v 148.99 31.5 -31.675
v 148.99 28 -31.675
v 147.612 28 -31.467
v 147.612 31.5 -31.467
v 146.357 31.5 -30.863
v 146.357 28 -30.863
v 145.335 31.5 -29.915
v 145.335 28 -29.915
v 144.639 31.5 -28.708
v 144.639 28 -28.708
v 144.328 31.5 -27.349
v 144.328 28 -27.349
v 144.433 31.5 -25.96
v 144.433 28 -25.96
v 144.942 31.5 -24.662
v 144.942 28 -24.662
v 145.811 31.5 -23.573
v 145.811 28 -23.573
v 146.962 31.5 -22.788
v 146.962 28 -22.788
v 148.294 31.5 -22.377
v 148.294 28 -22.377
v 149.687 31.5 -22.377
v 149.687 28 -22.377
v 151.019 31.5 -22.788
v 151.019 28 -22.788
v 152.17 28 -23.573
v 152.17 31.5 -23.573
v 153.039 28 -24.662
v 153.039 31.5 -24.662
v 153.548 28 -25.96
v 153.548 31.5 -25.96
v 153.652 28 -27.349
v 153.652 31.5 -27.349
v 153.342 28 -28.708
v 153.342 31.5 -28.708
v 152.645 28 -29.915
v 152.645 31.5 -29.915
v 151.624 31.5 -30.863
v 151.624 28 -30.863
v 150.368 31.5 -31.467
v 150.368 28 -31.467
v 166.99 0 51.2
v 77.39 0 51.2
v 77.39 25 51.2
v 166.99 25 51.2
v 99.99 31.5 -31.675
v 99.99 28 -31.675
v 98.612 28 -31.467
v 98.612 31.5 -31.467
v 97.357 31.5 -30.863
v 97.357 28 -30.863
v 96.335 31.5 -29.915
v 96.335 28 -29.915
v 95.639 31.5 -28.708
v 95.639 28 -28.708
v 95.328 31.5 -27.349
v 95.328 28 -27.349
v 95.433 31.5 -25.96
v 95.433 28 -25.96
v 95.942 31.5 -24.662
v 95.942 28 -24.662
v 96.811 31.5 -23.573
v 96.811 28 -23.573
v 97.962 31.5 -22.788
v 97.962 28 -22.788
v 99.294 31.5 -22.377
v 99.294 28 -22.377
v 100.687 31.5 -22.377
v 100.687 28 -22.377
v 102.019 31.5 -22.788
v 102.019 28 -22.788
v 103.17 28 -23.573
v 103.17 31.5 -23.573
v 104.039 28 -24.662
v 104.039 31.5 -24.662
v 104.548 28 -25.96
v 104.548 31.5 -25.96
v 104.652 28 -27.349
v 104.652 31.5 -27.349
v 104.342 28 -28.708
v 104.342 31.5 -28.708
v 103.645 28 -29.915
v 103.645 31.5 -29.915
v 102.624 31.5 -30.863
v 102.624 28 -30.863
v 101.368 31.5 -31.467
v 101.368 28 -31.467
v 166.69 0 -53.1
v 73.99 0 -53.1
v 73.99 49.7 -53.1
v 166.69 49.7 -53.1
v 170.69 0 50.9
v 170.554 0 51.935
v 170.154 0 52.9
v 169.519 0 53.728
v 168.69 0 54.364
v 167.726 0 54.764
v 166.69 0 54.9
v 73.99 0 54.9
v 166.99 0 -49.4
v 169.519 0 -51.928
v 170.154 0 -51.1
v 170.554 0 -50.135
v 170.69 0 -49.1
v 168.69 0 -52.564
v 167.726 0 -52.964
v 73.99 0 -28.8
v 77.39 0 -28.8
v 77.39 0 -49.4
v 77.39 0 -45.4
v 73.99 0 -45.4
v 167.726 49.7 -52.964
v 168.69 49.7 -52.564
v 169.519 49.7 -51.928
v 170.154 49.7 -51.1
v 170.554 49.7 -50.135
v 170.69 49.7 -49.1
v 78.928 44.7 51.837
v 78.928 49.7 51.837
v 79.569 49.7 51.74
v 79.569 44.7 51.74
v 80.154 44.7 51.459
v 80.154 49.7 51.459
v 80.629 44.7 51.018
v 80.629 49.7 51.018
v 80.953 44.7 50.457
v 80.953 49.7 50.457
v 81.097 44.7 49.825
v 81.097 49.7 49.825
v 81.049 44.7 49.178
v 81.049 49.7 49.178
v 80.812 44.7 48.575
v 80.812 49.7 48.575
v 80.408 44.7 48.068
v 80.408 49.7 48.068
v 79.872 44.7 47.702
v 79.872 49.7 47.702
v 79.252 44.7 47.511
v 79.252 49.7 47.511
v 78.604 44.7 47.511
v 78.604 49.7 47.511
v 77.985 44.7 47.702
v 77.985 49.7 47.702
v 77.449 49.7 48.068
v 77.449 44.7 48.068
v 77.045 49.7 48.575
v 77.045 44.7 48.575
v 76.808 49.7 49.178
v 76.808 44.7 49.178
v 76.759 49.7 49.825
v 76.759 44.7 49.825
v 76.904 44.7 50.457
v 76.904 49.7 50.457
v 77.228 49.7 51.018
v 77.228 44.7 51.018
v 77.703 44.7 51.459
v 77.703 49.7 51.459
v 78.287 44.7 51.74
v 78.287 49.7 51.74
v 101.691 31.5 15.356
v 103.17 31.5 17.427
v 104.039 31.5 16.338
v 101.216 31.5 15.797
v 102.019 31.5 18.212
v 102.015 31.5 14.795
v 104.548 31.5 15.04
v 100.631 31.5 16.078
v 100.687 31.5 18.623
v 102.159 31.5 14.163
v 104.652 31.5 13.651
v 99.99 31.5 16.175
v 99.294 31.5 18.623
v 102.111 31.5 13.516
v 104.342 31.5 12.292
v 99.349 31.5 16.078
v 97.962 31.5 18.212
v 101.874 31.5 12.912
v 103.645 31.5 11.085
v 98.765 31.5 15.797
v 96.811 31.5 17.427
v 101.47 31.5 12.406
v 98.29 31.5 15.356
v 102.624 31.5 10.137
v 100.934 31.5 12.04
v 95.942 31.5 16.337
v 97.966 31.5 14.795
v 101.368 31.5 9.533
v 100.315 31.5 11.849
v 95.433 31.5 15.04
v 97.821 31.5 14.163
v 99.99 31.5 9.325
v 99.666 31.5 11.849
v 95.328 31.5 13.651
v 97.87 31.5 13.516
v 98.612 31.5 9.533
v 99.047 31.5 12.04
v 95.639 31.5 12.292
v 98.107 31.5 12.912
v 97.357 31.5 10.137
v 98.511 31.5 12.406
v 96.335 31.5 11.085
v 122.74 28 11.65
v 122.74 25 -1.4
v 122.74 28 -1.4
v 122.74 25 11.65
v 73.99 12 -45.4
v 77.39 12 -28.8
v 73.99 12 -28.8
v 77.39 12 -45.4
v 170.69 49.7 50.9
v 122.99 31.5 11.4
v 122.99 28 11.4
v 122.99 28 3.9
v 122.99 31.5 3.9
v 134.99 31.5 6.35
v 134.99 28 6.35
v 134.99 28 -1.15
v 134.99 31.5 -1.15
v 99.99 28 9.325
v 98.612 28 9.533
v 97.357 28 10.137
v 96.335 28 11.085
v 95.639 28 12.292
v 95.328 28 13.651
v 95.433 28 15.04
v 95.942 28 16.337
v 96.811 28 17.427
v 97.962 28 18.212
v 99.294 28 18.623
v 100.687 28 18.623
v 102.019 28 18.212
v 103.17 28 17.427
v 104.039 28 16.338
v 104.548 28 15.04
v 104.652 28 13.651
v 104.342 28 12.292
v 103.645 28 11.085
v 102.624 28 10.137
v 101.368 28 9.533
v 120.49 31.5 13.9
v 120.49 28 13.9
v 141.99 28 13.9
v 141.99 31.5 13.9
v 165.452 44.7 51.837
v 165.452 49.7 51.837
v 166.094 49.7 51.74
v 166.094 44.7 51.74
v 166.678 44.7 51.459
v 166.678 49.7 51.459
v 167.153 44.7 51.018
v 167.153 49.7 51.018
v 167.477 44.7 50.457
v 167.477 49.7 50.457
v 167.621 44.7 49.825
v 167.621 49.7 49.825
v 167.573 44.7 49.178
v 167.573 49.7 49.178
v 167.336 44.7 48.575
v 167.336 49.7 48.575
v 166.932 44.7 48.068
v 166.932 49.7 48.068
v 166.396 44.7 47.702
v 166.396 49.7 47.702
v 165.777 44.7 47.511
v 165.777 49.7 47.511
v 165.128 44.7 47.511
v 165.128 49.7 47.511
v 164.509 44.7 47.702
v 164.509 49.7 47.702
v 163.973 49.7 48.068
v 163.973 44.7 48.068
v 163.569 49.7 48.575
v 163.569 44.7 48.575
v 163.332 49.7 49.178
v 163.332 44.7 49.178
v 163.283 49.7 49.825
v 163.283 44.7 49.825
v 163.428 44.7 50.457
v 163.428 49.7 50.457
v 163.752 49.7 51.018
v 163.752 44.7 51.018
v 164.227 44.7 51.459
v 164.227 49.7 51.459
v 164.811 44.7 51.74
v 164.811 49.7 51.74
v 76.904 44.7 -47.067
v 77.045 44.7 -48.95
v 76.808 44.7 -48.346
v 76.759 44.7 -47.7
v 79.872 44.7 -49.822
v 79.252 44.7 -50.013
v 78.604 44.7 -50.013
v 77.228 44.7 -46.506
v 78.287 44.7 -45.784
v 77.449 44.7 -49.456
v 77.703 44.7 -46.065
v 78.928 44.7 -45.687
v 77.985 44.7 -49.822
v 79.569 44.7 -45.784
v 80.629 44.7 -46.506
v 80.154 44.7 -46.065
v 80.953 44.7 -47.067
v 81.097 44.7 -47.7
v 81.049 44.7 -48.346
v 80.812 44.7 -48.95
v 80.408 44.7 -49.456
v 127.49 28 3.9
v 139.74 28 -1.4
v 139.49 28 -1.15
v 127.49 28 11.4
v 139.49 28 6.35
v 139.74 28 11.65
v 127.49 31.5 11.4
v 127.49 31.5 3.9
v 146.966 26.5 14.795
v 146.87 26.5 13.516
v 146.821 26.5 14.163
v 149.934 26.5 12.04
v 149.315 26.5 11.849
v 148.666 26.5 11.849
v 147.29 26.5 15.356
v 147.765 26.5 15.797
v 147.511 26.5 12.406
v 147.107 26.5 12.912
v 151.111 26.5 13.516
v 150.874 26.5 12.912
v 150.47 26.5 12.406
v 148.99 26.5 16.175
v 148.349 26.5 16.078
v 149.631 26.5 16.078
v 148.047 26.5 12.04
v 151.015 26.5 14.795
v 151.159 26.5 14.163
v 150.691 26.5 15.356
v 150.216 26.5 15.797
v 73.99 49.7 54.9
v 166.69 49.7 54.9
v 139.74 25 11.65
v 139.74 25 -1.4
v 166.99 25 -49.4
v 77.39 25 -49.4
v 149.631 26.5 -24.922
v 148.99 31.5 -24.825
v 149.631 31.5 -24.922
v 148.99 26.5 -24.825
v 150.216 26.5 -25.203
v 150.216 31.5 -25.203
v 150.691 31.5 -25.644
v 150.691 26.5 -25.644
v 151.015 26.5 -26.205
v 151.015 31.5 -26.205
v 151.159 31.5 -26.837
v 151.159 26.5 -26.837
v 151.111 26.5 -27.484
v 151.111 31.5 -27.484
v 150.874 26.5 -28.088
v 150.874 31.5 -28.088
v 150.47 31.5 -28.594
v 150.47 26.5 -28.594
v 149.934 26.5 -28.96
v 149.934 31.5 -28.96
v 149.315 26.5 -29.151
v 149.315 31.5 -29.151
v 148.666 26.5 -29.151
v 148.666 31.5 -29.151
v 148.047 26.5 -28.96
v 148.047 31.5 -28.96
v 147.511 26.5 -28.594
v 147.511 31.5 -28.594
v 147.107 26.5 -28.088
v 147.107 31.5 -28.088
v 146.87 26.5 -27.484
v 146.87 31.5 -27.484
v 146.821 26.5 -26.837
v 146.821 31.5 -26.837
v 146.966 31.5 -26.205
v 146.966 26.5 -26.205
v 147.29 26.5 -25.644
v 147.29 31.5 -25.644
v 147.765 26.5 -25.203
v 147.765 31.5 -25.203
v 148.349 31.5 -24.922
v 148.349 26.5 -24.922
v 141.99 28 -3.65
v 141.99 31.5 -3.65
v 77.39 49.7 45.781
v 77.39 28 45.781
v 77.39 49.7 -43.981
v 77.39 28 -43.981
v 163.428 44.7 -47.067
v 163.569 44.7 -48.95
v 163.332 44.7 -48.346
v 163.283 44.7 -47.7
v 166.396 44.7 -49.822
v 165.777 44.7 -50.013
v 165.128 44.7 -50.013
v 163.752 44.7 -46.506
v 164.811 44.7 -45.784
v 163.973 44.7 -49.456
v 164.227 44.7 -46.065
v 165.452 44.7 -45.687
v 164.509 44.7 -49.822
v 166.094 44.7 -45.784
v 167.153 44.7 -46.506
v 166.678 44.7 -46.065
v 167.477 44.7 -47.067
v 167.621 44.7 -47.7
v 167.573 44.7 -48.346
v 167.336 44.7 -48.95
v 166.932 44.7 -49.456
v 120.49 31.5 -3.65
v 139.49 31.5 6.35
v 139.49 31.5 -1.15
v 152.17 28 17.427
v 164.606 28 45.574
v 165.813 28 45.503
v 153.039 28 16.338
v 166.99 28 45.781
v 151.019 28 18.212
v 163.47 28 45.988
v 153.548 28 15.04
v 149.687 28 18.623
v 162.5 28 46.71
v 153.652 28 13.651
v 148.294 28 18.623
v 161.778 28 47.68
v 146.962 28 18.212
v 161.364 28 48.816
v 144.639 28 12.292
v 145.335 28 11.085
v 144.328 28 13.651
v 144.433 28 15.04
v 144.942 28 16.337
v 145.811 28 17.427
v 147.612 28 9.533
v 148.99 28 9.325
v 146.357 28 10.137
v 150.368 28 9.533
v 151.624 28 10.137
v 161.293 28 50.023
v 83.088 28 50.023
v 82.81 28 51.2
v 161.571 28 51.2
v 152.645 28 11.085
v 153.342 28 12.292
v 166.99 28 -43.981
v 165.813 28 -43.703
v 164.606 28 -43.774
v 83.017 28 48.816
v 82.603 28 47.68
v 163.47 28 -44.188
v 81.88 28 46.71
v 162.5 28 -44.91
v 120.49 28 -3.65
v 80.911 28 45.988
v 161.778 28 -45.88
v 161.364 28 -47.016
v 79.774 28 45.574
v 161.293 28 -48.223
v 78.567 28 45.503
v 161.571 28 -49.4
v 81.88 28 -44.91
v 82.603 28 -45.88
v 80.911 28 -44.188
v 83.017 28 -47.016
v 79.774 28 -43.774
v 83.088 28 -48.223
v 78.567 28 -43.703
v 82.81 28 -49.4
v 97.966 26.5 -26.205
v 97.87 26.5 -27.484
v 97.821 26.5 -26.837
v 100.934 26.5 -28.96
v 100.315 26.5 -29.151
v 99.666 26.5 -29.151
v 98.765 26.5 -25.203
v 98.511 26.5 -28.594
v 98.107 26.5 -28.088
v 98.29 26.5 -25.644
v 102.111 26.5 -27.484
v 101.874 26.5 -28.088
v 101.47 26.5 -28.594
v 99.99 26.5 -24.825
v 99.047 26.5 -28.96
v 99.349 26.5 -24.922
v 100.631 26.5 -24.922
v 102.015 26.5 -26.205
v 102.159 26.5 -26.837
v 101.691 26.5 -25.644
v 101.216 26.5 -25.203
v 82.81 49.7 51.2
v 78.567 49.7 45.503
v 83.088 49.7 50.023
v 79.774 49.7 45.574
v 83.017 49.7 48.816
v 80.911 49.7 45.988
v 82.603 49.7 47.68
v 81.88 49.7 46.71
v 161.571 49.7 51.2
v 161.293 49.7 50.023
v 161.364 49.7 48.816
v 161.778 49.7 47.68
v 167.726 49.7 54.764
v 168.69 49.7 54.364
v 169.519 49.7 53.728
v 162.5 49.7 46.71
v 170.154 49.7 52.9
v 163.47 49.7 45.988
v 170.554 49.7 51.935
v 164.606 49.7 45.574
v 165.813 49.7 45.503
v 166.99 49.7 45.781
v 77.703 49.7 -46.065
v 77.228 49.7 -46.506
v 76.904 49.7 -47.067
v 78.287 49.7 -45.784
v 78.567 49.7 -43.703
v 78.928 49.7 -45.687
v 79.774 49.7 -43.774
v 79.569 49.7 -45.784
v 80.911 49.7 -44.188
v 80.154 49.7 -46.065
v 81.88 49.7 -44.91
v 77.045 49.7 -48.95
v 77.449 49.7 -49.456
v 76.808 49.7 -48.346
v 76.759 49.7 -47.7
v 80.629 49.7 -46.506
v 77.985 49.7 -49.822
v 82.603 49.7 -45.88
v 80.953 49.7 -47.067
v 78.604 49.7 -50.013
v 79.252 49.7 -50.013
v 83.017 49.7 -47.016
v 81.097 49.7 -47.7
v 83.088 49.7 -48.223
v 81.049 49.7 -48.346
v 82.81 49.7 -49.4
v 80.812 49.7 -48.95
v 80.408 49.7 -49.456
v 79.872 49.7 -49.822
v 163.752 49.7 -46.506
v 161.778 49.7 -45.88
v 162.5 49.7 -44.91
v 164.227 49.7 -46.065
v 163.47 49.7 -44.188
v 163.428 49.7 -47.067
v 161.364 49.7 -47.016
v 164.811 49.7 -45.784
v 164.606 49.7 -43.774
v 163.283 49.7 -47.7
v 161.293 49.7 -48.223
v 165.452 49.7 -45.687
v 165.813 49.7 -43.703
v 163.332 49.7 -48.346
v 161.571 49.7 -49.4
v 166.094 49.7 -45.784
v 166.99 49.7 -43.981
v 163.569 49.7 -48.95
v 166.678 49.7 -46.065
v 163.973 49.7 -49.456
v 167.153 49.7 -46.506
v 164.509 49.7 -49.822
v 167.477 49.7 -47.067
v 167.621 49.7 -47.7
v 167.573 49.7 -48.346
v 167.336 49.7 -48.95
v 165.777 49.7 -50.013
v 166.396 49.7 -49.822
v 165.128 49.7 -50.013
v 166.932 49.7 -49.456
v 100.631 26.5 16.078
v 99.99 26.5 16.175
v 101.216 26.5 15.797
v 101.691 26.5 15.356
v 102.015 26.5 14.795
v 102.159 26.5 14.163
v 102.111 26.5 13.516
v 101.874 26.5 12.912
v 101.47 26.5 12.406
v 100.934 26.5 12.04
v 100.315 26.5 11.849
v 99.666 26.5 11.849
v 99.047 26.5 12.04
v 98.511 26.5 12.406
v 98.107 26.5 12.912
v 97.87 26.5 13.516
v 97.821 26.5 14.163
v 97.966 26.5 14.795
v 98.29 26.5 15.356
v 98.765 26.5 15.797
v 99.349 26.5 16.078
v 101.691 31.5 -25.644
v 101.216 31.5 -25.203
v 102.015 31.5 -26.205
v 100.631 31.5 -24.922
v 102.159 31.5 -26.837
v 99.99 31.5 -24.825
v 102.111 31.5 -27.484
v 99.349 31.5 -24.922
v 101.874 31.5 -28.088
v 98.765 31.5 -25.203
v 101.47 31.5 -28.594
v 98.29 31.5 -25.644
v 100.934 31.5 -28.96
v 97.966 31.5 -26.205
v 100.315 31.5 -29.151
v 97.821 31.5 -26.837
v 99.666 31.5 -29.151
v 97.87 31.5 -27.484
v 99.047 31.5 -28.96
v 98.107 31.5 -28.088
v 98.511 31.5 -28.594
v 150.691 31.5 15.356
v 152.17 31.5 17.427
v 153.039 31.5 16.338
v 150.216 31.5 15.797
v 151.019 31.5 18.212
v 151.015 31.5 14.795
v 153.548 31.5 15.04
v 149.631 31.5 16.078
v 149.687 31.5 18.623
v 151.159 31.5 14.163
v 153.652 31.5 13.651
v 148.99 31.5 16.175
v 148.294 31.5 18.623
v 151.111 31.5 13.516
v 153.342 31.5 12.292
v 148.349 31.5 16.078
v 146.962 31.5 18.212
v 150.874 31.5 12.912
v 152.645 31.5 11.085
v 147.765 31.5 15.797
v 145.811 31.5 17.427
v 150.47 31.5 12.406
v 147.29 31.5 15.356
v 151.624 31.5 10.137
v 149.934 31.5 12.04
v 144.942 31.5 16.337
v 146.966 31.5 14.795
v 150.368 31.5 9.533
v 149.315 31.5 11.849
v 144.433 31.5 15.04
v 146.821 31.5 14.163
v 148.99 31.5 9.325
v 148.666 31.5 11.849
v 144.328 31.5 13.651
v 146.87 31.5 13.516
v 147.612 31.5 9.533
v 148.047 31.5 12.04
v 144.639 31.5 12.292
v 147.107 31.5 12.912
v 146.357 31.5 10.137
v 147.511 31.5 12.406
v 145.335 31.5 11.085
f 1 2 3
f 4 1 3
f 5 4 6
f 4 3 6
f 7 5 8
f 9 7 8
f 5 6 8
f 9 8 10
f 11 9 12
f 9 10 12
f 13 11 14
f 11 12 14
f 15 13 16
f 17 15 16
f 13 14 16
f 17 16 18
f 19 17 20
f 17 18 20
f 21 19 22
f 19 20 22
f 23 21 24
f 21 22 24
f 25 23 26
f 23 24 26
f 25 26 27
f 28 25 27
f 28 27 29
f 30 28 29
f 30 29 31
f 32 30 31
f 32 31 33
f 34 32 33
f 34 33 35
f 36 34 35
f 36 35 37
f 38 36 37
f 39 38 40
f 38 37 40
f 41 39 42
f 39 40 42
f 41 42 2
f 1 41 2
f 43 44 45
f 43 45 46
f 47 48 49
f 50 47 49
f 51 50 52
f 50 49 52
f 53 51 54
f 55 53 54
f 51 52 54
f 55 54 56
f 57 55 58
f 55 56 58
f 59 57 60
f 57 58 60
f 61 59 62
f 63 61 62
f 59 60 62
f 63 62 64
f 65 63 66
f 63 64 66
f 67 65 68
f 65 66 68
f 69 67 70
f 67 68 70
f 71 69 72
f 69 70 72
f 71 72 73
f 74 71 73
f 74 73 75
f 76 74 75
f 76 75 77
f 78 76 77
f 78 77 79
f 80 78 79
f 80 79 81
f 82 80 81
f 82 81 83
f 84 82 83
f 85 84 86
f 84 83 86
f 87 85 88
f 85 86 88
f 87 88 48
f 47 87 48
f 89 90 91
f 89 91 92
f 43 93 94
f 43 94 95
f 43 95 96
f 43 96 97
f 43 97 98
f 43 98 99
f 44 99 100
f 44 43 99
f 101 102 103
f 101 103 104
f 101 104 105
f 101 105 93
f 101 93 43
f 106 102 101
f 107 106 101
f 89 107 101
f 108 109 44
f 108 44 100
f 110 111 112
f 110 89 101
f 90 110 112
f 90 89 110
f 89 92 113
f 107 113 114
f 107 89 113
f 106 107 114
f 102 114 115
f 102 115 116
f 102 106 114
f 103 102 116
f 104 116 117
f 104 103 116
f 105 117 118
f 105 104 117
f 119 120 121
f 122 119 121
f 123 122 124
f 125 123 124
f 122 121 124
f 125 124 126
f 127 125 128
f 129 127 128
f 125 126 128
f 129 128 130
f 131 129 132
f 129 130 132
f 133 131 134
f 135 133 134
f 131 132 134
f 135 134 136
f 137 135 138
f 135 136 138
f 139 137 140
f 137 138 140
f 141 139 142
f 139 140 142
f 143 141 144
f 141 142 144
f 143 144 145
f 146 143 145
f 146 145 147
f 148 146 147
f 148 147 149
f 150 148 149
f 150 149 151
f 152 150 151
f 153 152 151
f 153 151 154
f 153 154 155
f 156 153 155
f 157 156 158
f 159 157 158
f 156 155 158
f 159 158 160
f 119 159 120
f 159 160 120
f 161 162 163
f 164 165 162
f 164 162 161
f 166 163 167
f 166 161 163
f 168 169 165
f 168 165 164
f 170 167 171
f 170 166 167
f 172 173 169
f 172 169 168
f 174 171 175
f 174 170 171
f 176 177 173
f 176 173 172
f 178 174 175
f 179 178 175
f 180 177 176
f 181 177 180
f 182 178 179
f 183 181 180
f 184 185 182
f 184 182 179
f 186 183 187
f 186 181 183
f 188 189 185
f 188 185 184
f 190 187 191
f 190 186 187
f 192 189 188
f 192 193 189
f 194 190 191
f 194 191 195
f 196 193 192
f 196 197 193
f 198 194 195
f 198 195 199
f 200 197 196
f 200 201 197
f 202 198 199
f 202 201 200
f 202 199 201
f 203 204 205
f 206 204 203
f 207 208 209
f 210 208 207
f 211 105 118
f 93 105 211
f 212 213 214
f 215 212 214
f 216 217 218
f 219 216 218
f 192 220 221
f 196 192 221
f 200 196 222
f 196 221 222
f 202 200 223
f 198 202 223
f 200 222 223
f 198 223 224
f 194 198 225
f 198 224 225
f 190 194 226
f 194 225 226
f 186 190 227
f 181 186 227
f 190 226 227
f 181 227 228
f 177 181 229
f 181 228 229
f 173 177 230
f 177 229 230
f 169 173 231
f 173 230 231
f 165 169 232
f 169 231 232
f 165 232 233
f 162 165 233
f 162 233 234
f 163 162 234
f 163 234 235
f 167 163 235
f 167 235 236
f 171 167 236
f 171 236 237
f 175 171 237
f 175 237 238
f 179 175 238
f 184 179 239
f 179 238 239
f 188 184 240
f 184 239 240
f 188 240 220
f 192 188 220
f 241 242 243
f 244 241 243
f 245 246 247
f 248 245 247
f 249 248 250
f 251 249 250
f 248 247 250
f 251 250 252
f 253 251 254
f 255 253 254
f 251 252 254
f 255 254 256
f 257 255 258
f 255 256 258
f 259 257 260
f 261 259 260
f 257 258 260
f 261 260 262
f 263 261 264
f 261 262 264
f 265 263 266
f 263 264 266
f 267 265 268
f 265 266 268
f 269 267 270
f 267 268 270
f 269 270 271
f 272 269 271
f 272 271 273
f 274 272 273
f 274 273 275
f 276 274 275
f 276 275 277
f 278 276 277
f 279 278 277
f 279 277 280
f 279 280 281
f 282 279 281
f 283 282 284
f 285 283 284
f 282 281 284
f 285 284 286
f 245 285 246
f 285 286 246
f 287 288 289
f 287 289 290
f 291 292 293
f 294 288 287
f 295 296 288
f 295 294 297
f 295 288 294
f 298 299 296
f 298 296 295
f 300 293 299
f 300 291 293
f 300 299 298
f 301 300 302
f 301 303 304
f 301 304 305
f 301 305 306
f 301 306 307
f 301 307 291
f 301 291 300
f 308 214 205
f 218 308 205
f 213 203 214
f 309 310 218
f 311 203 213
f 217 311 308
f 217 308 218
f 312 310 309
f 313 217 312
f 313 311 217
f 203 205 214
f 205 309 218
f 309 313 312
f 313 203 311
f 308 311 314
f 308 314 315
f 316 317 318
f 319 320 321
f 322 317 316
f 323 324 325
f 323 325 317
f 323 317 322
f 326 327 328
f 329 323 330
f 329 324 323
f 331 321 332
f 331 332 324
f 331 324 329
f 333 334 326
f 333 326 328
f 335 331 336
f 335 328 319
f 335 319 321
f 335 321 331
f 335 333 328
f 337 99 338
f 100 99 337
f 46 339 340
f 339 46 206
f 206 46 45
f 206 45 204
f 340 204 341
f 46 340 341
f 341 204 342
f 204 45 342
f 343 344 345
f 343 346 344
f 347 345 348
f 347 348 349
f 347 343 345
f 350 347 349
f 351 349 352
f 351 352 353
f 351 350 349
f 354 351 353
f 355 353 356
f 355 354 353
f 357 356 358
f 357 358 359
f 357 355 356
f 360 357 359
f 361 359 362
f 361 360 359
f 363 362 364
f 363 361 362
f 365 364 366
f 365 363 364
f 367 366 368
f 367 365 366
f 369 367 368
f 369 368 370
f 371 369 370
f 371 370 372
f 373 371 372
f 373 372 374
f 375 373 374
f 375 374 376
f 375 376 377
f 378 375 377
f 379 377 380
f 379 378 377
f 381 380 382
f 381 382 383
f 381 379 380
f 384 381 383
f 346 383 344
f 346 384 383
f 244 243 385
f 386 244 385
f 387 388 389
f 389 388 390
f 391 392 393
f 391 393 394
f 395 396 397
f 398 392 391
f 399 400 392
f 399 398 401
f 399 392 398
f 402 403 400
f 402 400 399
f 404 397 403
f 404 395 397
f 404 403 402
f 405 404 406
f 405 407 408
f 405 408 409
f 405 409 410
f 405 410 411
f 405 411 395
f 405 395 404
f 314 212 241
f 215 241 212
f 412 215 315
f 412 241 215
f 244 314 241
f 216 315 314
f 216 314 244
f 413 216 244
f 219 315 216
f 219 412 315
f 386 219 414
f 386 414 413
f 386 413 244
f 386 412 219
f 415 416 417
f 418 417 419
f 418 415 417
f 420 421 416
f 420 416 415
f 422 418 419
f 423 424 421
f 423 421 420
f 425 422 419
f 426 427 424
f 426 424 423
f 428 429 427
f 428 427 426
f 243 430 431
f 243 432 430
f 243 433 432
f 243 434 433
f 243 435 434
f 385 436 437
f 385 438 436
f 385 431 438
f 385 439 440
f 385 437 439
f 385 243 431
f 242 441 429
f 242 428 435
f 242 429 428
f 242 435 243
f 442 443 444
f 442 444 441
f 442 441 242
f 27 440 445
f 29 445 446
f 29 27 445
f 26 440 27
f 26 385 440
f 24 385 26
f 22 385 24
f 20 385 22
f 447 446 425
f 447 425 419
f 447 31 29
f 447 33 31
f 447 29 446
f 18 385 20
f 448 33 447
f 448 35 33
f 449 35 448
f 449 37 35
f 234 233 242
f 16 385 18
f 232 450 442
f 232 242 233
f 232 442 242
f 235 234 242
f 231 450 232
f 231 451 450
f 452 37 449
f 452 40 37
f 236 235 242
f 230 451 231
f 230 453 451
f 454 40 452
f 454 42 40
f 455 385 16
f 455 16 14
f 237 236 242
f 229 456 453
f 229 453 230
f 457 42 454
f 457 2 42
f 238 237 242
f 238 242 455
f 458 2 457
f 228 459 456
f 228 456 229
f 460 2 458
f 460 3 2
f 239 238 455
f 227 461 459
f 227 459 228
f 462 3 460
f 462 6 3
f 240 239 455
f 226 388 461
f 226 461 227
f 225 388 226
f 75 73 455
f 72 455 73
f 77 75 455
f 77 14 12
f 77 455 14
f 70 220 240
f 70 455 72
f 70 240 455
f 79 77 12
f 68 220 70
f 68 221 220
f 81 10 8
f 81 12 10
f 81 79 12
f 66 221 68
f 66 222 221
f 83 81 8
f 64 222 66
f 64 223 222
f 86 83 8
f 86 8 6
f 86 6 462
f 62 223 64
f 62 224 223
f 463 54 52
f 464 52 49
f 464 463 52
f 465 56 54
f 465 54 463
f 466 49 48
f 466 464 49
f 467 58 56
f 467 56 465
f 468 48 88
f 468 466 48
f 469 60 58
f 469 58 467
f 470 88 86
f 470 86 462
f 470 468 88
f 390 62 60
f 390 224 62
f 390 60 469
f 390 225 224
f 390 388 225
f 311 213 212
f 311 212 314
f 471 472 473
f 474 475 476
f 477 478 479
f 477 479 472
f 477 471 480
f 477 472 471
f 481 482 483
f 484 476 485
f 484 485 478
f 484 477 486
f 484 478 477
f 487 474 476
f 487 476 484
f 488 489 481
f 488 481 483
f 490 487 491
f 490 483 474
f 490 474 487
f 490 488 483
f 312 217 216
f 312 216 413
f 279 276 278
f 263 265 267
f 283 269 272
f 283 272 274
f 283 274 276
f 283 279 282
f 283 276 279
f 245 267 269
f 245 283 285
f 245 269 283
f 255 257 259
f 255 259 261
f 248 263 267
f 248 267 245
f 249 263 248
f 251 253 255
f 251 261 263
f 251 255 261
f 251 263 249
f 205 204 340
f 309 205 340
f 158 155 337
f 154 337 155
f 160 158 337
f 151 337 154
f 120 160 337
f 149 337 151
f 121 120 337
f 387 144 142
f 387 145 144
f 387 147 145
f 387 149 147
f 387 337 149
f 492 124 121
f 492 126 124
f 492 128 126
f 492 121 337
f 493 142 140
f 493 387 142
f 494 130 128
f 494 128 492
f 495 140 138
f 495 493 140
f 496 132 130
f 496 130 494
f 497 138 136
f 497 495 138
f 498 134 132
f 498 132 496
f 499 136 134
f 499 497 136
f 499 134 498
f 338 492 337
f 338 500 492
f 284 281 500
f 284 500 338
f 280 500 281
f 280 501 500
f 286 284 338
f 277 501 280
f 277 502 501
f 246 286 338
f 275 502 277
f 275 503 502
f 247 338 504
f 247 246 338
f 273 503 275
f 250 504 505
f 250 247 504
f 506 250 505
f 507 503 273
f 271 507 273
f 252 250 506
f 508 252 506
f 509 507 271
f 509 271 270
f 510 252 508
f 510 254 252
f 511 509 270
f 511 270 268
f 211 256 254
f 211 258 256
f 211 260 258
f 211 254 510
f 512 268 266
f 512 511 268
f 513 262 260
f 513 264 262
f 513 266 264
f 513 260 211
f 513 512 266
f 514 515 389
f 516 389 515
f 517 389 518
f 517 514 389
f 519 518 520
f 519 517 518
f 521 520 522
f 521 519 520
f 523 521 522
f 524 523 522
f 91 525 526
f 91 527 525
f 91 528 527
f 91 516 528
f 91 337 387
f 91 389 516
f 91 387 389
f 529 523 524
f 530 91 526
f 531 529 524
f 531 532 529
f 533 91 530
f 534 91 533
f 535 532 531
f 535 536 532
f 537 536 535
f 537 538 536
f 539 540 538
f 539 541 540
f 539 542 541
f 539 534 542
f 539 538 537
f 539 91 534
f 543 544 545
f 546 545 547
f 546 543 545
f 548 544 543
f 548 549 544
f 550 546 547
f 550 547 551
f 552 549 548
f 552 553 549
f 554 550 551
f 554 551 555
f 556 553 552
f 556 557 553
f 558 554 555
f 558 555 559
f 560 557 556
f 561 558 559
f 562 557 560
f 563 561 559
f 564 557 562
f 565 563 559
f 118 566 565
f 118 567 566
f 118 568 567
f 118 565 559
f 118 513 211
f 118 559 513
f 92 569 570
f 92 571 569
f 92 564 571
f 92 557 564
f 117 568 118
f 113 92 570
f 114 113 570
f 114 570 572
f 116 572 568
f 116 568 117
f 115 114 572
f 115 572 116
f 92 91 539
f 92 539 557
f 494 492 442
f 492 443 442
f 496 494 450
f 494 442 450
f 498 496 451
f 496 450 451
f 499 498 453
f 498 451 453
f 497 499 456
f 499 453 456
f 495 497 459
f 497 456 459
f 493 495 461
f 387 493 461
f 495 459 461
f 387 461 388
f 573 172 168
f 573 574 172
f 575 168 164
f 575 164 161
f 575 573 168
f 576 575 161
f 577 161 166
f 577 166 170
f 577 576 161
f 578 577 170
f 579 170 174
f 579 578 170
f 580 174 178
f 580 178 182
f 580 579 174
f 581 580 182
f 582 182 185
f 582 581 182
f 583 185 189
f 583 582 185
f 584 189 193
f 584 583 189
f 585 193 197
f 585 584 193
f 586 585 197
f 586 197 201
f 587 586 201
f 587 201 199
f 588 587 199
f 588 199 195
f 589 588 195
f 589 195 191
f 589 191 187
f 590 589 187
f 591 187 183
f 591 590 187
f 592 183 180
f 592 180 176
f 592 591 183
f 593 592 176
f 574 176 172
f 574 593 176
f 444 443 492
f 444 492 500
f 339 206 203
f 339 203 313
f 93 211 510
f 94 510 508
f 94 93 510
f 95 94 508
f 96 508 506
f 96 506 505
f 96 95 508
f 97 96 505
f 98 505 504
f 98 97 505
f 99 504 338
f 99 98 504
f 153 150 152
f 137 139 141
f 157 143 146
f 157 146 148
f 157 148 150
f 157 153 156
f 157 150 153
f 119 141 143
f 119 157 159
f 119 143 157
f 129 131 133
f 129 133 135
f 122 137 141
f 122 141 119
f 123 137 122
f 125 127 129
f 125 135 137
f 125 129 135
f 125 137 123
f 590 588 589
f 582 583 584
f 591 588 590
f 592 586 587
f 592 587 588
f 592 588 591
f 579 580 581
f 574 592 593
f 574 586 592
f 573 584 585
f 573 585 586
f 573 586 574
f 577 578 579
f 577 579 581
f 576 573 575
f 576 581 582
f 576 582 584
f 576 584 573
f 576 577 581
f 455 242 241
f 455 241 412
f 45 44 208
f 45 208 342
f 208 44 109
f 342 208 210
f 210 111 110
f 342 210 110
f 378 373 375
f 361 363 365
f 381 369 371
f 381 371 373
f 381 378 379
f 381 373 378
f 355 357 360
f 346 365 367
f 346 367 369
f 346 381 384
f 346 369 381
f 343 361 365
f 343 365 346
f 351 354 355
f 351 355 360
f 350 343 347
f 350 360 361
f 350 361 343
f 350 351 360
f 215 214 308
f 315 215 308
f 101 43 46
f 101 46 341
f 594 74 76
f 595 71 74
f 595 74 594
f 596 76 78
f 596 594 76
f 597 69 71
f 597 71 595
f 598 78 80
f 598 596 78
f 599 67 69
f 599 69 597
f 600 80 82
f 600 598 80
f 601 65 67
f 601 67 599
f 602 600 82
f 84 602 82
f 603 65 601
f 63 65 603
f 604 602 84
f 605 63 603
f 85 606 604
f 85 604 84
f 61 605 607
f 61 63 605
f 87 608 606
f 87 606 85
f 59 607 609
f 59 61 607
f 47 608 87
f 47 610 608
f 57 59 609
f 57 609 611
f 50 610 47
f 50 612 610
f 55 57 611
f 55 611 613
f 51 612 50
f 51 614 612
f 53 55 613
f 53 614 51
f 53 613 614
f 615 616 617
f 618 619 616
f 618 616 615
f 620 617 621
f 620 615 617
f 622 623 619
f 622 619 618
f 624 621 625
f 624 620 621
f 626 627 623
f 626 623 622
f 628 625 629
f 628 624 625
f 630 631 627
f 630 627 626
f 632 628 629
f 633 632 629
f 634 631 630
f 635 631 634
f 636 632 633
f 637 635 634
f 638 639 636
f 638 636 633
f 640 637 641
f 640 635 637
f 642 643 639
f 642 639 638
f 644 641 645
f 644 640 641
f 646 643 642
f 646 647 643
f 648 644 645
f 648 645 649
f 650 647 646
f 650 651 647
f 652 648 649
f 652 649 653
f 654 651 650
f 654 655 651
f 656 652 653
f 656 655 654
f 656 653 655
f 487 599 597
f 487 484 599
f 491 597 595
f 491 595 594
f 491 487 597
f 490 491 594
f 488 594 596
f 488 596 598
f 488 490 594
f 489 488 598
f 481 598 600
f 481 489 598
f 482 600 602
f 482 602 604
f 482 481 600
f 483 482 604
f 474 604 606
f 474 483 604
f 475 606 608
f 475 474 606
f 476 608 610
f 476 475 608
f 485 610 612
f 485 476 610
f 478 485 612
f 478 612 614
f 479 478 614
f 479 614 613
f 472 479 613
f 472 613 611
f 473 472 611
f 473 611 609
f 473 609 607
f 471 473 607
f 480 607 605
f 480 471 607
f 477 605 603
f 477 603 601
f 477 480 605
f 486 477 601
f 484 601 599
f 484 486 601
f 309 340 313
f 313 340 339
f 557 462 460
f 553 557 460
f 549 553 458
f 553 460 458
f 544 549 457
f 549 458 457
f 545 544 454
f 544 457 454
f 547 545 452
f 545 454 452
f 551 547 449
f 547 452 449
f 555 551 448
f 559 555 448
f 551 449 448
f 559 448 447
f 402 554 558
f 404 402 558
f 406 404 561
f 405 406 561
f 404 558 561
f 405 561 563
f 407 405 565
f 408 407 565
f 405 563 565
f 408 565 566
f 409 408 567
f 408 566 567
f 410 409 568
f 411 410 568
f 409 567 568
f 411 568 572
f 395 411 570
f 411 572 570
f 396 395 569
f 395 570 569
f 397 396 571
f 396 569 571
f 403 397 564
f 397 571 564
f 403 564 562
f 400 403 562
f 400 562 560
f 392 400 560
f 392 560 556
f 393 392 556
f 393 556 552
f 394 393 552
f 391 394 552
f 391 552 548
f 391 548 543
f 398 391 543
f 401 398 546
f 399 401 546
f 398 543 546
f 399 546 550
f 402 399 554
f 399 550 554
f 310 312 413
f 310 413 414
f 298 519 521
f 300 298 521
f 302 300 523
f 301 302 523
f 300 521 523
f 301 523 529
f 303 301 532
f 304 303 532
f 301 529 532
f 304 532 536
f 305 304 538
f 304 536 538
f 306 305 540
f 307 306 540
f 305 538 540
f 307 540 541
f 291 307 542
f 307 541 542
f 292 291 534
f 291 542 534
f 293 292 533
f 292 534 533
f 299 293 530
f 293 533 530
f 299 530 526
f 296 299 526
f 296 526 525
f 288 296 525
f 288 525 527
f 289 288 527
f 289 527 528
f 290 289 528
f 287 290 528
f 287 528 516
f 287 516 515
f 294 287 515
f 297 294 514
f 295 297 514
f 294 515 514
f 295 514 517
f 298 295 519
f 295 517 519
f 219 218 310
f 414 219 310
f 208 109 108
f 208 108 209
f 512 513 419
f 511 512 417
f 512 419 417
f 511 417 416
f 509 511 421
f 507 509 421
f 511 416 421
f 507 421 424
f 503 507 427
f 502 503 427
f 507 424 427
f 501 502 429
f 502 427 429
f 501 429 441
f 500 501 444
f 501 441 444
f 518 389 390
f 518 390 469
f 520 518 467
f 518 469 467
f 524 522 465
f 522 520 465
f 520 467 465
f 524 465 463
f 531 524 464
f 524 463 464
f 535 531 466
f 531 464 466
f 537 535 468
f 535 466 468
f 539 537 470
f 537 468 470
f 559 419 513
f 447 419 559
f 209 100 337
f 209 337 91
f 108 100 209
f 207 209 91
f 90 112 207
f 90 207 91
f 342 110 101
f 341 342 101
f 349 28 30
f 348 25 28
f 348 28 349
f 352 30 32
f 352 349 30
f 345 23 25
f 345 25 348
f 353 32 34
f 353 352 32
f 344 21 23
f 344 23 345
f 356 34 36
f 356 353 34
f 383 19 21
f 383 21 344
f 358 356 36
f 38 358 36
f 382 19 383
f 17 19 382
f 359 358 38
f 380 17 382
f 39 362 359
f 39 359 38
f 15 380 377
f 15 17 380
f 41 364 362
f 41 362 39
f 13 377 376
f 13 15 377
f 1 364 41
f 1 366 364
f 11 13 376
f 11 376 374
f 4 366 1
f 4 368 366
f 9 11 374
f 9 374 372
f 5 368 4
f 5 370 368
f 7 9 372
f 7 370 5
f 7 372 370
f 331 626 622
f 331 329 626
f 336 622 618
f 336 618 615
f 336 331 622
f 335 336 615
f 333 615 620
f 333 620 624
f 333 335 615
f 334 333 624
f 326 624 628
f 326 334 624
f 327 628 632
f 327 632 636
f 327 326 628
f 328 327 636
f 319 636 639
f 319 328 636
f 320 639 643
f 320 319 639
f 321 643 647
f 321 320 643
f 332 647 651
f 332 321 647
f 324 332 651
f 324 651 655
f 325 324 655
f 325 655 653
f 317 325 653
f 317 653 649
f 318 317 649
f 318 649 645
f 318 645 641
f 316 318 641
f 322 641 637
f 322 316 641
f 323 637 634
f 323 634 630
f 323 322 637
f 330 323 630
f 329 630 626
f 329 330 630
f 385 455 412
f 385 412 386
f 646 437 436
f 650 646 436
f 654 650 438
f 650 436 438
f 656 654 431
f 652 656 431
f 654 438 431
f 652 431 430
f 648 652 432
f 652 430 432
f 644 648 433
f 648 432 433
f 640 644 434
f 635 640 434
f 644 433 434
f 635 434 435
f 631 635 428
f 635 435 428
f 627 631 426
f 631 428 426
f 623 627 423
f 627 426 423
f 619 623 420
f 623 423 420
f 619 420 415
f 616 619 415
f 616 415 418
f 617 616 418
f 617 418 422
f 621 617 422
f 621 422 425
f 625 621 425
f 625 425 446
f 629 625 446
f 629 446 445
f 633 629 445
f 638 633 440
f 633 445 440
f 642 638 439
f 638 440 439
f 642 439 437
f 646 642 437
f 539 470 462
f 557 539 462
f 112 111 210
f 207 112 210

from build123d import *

# Parameters (mm, degrees)
SKETCH1_W           = 89.6
SKETCH1_H           = 100.6
BOSS_EXTRUDE1_DEPTH = 49.7
SKETCH4_W           = 16.6
SKETCH4_H           = 12
CUT_EXTRUDE1_DEPTH  = 120.117546986
SKETCH5_W           = 100.6
SKETCH5_H           = 3
BOSS_EXTRUDE2_DEPTH = 89.6
SKETCH7_R           = 4.175
BOSS_EXTRUDE3_DEPTH = 21.7
CUT_EXTRUDE2_START  = 21.7
SKETCH7_3_R         = 2.175
CUT_EXTRUDE2_DEPTH  = 5
SKETCH9_R           = 4.675
SKETCH9_R_2         = 2.175
BOSS_EXTRUDE4_DEPTH = 3.5
CUT_EXTRUDE4_START  = -1.5
SKETCH9_2_R         = 2.175
CUT_EXTRUDE4_DEPTH  = 1.5
SKETCH11_W          = 21.5
SKETCH11_H          = 17.55
SKETCH11_W_2        = 4.5
SKETCH11_H_2        = 7.5
BOSS_EXTRUDE5_DEPTH = 3.5
SKETCH12_W          = 17
SKETCH12_H          = 13.05
CUT_EXTRUDE5_DEPTH  = 3


with BuildPart() as part:
    # Sketch1 → Boss-Extrude1 (new body)
    with BuildSketch(Plane(origin=(0, 0, 0), x_dir=(1, 0, 0), z_dir=(0, 1, 0))):
        with BuildLine():
            Line((73.990371034, 53.1), (166.690371034, 53.1))
            ThreePointArc((166.690371034, 53.1), (169.518798158, 51.928427125), (170.690371034, 49.1))
            Line((170.690371034, 49.1), (170.690371034, -50.9))
            ThreePointArc((170.690371034, -50.9), (169.518798158, -53.728427125), (166.690371034, -54.9))
            Line((166.690371034, -54.9), (73.990371034, -54.9))
            Line((73.990371034, -54.9), (73.990371034, 53.1))
        make_face()
        with Locations((122.190371034, -0.9)):
            Rectangle(SKETCH1_W, SKETCH1_H, mode=Mode.SUBTRACT)
    extrude(amount=BOSS_EXTRUDE1_DEPTH)

    # Sketch4 → Cut-Extrude1 (cut, through all)
    with BuildSketch(Plane(origin=(77.390371034, 0, 0), x_dir=(0, 0, -1), z_dir=(1, 0, 0))):
        with Locations((37.1, 6)):
            Rectangle(SKETCH4_W, SKETCH4_H)
    extrude(amount=-CUT_EXTRUDE1_DEPTH, mode=Mode.SUBTRACT)

    # Sketch5 → Boss-Extrude2 (add)
    with BuildSketch(Plane(origin=(77.390371034, 0, 0), x_dir=(0, 0, -1), z_dir=(1, 0, 0))):
        with Locations((-0.9, 26.5)):
            Rectangle(SKETCH5_W, SKETCH5_H)
    extrude(amount=BOSS_EXTRUDE2_DEPTH)

    # Sketch7 → Boss-Extrude3 (add)
    with BuildSketch(Plane(origin=(0, 28, 0), x_dir=(1, 0, 0), z_dir=(0, 1, 0))):
        with Locations((78.928328283, 47.862042751)):
            Circle(SKETCH7_R)
        with Locations((165.452413785, 47.862042751)):
            Circle(SKETCH7_R)
        with Locations((165.452413785, -49.662042751)):
            Circle(SKETCH7_R)
        with Locations((78.928328283, -49.662042751)):
            Circle(SKETCH7_R)
    extrude(amount=BOSS_EXTRUDE3_DEPTH)

    # Sketch7<3> → Cut-Extrude2 (cut)
    with BuildSketch(Plane(origin=(0, 28, 0), x_dir=(1, 0, 0), z_dir=(0, 1, 0)).offset(CUT_EXTRUDE2_START)):
        with Locations(Location((78.928328283, 47.862042751, 0), (0, 0, 270))):
            Circle(SKETCH7_3_R)
        with Locations(Location((165.452413785, 47.862042751, 0), (0, 0, 270))):
            Circle(SKETCH7_3_R)
        with Locations(Location((165.452413785, -49.662042751, 0), (0, 0, 270))):
            Circle(SKETCH7_3_R)
        with Locations(Location((78.928328283, -49.662042751, 0), (0, 0, 270))):
            Circle(SKETCH7_3_R)
    extrude(amount=-CUT_EXTRUDE2_DEPTH, mode=Mode.SUBTRACT)

    # Sketch9 → Boss-Extrude4 (add)
    # profile 1 of 4: a face of its own
    with BuildSketch(Plane(origin=(0, 28, 0), x_dir=(1, 0, 0), z_dir=(0, 1, 0))):
        with Locations(Location((148.990371034, -14, 0), (0, 0, 90))):
            Circle(SKETCH9_R)
        with Locations(Location((148.990371034, -14, 0), (0, 0, 270))):
            Circle(SKETCH9_R_2, mode=Mode.SUBTRACT)
    # profile 2 of 4: a face of its own
    with BuildSketch(Plane(origin=(0, 28, 0), x_dir=(1, 0, 0), z_dir=(0, 1, 0))):
        with Locations(Location((99.990371034, -14, 0), (0, 0, 90))):
            Circle(SKETCH9_R)
        with Locations(Location((99.990371034, -14, 0), (0, 0, 270))):
            Circle(SKETCH9_R_2, mode=Mode.SUBTRACT)
    # profile 3 of 4: a face of its own
    with BuildSketch(Plane(origin=(0, 28, 0), x_dir=(1, 0, 0), z_dir=(0, 1, 0))):
        with Locations(Location((99.990371034, 27, 0), (0, 0, 90))):
            Circle(SKETCH9_R)
        with Locations(Location((99.990371034, 27, 0), (0, 0, 270))):
            Circle(SKETCH9_R_2, mode=Mode.SUBTRACT)
    # profile 4 of 4: a face of its own
    with BuildSketch(Plane(origin=(0, 28, 0), x_dir=(1, 0, 0), z_dir=(0, 1, 0))):
        with Locations(Location((148.990371034, 27, 0), (0, 0, 90))):
            Circle(SKETCH9_R)
        with Locations(Location((148.990371034, 27, 0), (0, 0, 270))):
            Circle(SKETCH9_R_2, mode=Mode.SUBTRACT)
    extrude(amount=BOSS_EXTRUDE4_DEPTH)

    # Sketch9<2> → Cut-Extrude4 (cut)
    with BuildSketch(Plane(origin=(0, 28, 0), x_dir=(1, 0, 0), z_dir=(0, 1, 0)).offset(CUT_EXTRUDE4_START)):
        with Locations(Location((99.990371034, 27, 0), (0, 0, 270))):
            Circle(SKETCH9_2_R)
        with Locations(Location((148.990371034, 27, 0), (0, 0, 270))):
            Circle(SKETCH9_2_R)
        with Locations(Location((99.990371034, -14, 0), (0, 0, 270))):
            Circle(SKETCH9_2_R)
        with Locations(Location((148.990371034, -14, 0), (0, 0, 270))):
            Circle(SKETCH9_2_R)
    extrude(amount=CUT_EXTRUDE4_DEPTH, mode=Mode.SUBTRACT)

    # Sketch11 → Boss-Extrude5 (add)
    with BuildSketch(Plane(origin=(0, 28, 0), x_dir=(1, 0, 0), z_dir=(0, 1, 0))):
        with Locations((131.240371034, -5.125)):
            Rectangle(SKETCH11_W, SKETCH11_H)
        with Locations((125.240371034, -7.65)):
            Rectangle(SKETCH11_W_2, SKETCH11_H_2, mode=Mode.SUBTRACT)
        with Locations((137.240371034, -2.6)):
            Rectangle(SKETCH11_W_2, SKETCH11_H_2, mode=Mode.SUBTRACT)
    extrude(amount=BOSS_EXTRUDE5_DEPTH)

    # Sketch12 → Cut-Extrude5 (cut)
    with BuildSketch(Plane.XZ.offset(-25)):
        with Locations((131.240371034, 5.125)):
            Rectangle(SKETCH12_W, SKETCH12_H)
    extrude(amount=-CUT_EXTRUDE5_DEPTH, mode=Mode.SUBTRACT)


solid = part.part
